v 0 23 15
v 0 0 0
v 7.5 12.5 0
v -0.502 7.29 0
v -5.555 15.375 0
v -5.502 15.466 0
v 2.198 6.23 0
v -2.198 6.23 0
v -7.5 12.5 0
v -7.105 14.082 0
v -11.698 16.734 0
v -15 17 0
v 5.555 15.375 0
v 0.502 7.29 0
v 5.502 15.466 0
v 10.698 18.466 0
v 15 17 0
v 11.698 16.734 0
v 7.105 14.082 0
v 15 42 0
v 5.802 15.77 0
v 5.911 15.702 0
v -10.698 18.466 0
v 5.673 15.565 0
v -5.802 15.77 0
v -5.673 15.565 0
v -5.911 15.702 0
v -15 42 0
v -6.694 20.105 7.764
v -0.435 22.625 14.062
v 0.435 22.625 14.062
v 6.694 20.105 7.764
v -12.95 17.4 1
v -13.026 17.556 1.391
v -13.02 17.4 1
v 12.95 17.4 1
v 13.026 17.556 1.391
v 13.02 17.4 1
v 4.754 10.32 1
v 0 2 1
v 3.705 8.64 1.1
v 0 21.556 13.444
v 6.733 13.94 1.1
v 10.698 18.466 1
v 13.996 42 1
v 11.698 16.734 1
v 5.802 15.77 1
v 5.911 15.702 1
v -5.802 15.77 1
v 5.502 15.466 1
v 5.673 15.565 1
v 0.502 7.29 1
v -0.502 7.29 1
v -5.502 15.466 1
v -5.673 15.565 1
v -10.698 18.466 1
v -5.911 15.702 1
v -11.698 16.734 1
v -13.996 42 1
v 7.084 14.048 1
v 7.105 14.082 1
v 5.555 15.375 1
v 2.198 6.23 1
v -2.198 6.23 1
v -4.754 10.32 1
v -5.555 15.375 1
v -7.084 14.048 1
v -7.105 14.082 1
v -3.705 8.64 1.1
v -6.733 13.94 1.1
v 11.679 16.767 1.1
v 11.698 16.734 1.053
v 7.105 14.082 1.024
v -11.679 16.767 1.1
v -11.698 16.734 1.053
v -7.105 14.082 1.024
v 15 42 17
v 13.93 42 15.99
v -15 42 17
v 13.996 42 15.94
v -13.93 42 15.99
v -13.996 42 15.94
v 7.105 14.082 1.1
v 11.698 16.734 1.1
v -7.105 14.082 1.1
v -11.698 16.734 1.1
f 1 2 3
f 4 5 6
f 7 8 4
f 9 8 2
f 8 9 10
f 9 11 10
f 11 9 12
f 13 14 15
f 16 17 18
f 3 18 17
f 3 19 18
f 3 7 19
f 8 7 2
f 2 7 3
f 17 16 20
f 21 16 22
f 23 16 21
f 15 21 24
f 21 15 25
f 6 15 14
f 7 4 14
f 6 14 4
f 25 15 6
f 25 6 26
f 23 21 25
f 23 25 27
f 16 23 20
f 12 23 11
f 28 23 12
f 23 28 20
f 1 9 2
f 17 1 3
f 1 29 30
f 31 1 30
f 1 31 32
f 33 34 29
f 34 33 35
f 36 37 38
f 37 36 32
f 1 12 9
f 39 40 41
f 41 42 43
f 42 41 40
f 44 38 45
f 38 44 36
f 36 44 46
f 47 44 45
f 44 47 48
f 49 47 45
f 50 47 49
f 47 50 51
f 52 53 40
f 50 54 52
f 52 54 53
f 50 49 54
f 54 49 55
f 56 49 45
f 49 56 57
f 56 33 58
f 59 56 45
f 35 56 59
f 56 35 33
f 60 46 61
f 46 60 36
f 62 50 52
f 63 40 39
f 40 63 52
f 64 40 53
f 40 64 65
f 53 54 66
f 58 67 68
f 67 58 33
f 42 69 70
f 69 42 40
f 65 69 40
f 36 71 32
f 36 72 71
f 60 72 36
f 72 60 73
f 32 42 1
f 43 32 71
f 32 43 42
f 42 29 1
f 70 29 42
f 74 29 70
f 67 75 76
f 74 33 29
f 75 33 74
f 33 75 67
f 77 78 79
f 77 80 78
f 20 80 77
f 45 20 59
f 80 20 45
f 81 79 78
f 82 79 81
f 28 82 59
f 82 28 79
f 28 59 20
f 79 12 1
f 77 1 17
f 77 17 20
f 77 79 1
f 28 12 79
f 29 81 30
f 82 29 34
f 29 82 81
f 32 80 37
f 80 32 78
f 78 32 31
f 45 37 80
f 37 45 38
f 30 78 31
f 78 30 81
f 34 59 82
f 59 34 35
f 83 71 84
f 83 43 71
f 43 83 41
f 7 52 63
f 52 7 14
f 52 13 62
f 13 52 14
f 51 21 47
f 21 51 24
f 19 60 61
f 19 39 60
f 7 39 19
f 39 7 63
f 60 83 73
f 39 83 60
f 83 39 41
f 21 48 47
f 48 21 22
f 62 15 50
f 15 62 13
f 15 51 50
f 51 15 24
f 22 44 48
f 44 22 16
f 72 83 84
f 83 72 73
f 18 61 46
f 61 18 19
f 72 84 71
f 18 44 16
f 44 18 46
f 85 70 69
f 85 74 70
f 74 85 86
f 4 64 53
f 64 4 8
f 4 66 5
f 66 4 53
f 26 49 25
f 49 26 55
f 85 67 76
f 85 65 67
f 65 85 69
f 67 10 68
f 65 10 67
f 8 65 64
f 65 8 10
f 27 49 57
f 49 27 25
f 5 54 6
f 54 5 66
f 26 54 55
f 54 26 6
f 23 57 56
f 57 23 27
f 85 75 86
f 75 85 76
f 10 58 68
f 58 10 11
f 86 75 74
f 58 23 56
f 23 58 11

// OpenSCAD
// file: Param.scad
//axe : disponible : 320*2/350*2/370*2/470*4/405*2
axe_x = 370;
axe_y = 470;
axe_z = 370;

Frame_e = 16;
coulisse_d = 8;
angle_e=3.5;

// Constant
r608z_d=8;
r608z_D=22;
r608z_e=7;

nema17_L=42;
nema17_axe_d=5.2;

Pulley_GT2_8_e=17.5;
Pulley_GT2_8_D=26;
Pulley_GT2_8_tooth_w=6.2;

GT2_w=6;

BagueLaiton_D=12;
BagueLaiton_L=30;

Vis_m3_p = 3.2;
Vis_m3_t = 5;

Head_x = BagueLaiton_D/2+12;
Head_y = coulisse_d/2+20;
Head_z = 20;

Fan_radial_e_h=15;
Fan_radial_e_l=19.2;

// resolution of round object. each line segment is fnr mm long. fnr = 1 crude and good for development (its faster), aim for fnr = 0.4 or smaller for a production render. smaller means more details (and a lot more time to render).
resolution = 0.4;
// detail level
detaillevel = 1; // [0:coarse render only outlines,1:fine render with all details]
// 
withfan = 0; // [0:render without fan frame,1:render with fan frame]

_globalResolution = 20;

// Data
Frame_L = axe_x-Pulley_GT2_8_e-angle_e+Frame_e;
Frame_l = axe_y-Pulley_GT2_8_e-angle_e+Frame_e;
Frame_h = axe_z;

coulisse_e = 3*coulisse_d+1;
coulisse_eh = (r608z_D*1.7)/2+4;
coulisse_ec = r608z_D+10;

Cross_ec = BagueLaiton_D+1;

angle_h=coulisse_e+coulisse_eh+r608z_D;
// main file
include <Param.scad>;

module pyramid(w, l, h, L) {
	mw = w/2;
	ml = l/2;
	polyhedron(points = [
		[0,  0,  0],
		[w,  l,  0],
		[-w,  l,  0],
		[0, L, h]
	], faces = [
		[3, 1, 0],
		[3, 0, 2],
        [3, 2,1],
		//base
		[0, 1, 2]
	],convexity = 10);
}

module holl() {
    union() {
        rotate([0,0,58]) cube([10,2,1.2], center =true);
        translate([4.6,5.1,0]) rotate([0,0,30]) cube([6,2,1.2], center =true);
    }
}

module headCooler() {
   difference() {
        union() { 
            corps1(h=15, e=1, l=15);
            //corps2(h=15, e=1, l=15);
            translate([0,17,0]) corps3(h=15, e=1, l=15);
        }
        translate([4,11,0.5]) {
            holl();
        }
        translate([-4,11,0.5]) mirror([1,0,0]) holl();
    }
}

module corps1(h,e, l) {
    difference() {
        union() {
            pyramid(9,l,h, 23);
            translate([0,8,0])pyramid(l,9,h, 15);
        }
        translate([0,2,1]) union() {
            pyramid(8,l-e,h-e, 22);
            translate([0,8,0])pyramid(l-e,8,h-e, 13);
        }
    }
}

module corps2(h,e, l) {
    difference() {
        polyhedron(points = [[0,23,h],[l,17,0],[-l,17,0],[l,23,0],[-l,23,0] ],
                faces= [[0,1,2], [0,3,1], [0,4,3],[0,2,4], [1,3,4,2]],convexity = 10);
        polyhedron(points = [[0,22,h-e],[l-2*e,17,e],[-l+2*e,17,e],[0,24,h-e],[l-e*2,23,e],[-l+2*e,23,e] ],
                faces= [[0,1,2], [0,3,4,1], [3,5,4], [0,2,5,3], [1,4,5,2]],convexity = 10);
    }
}

module corps3(h, e, l) {
    L=25;
    difference() {
        polyhedron(points = [[0,6,h],[l,0,0], [-l,0,0], [l,L,0], [l,L,Fan_radial_e_h+2*e], [-l,L,Fan_radial_e_h+2*e], [-l,L,0]],
                faces= [[0,1,2], [0,4,1], [4,3,1], [0,5,4], [4,5,6,3], [0,2,5], [5,2,6], [1,3,6,2]],convexity = 10);
        polyhedron(points = [[0,5,h-e],[l-2*e,-0.1,e], [-l+2*e,-0.1,e], [l-e,L+0.1,e], [l-e,L+0.1,Fan_radial_e_h+e], [-l+e,L+0.1,Fan_radial_e_h+e], [-l+e,L+0.1,e]],
                faces= [[0,1,2], [0,4,1], [4,3,1], [0,5,4], [4,5,6,3], [0,2,5], [5,2,6], [1,3,6,2]],convexity = 10);
    }
}

headCooler();


//color ("red") translate([-18.5, -0,-28]) rotate([0, 0, 0]) import("../stl/Chimera_Part_Cooling_Duct.stl");
